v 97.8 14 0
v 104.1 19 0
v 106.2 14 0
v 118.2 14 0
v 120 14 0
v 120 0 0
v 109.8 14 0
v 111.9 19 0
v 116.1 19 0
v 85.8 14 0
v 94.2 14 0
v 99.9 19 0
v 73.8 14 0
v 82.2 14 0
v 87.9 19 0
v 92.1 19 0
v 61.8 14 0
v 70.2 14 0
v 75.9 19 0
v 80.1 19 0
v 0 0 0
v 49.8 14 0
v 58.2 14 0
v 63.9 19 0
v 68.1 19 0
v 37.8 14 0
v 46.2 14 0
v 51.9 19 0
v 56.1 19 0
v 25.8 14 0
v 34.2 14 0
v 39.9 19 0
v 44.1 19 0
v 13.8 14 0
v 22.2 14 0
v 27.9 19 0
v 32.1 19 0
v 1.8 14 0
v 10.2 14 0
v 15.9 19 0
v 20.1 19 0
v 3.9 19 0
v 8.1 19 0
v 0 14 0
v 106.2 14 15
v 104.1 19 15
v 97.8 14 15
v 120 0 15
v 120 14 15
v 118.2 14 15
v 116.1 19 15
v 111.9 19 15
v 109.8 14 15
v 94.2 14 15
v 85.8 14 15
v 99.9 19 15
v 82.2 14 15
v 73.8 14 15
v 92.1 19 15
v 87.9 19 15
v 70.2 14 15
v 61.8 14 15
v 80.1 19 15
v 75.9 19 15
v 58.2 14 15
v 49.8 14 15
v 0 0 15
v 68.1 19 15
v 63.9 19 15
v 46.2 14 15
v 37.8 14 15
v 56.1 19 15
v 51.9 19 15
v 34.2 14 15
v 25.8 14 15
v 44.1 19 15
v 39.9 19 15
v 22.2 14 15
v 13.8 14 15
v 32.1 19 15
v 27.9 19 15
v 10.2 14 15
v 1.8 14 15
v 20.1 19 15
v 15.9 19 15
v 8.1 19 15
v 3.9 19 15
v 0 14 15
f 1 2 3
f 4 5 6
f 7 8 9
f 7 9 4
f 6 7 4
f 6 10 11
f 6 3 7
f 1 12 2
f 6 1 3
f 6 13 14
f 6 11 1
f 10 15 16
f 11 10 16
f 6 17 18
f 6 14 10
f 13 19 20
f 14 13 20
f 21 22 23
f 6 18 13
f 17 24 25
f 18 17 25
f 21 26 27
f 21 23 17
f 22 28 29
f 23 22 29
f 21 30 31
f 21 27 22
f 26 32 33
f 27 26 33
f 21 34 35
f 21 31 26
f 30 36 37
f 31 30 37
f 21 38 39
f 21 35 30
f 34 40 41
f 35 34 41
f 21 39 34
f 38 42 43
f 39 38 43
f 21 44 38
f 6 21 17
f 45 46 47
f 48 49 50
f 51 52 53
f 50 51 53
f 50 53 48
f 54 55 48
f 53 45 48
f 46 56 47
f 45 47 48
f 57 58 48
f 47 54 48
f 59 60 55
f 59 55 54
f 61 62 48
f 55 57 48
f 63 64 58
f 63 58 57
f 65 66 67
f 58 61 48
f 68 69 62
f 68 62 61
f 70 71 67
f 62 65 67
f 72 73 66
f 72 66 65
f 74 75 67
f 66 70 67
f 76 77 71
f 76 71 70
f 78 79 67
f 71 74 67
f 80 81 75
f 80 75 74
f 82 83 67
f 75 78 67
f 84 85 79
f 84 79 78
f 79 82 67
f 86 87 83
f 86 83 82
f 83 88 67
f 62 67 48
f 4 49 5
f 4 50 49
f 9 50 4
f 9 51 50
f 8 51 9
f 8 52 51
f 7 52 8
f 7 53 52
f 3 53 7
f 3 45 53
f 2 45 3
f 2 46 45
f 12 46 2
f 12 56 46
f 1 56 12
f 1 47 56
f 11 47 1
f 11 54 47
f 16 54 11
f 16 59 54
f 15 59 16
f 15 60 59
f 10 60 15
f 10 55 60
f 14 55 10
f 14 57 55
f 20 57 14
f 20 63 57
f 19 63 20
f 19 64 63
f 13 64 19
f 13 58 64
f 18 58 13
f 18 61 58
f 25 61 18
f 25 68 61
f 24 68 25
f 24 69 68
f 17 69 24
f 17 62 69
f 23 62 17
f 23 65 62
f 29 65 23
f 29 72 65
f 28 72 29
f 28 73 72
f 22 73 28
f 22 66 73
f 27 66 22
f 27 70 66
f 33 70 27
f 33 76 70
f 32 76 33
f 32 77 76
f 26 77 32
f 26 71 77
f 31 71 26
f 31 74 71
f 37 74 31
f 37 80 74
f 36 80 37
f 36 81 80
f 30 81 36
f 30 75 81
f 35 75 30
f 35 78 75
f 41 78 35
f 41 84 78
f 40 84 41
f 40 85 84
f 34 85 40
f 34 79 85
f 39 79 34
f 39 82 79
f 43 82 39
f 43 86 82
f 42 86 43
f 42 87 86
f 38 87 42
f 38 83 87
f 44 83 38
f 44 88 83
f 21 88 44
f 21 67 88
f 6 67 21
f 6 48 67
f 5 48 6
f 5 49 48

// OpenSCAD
$fn = 32;

// ----------------------------------------------------------------------
// Gear rack: 10 teeth, pitch 12 mm
// ----------------------------------------------------------------------

// --- parameters (mm) ---
teeth = 10;               // number of teeth
pitch = 12;               // tooth pitch, X
root_w = 8.4;             // tooth width at the root
tip_w = 4.2;              // tooth width at the tip
base_h = 14;              // rack body height, Y
tooth_h = 5;              // tooth height above the body
plate_t = 15;             // rack width, Z (extrusion height)

rack_l = teeth * pitch;  // overall length
total_h = base_h + tooth_h;  // overall height

profile = [[0, 0], [120, 0], [120, 14], [118.2, 14], [116.1, 19], [111.9, 19], [109.8, 14], [106.2, 14], [104.1, 19], [99.9, 19], [97.8, 14], [94.2, 14], [92.1, 19], [87.9, 19], [85.8, 14], [82.2, 14], [80.1, 19], [75.9, 19], [73.8, 14], [70.2, 14], [68.1, 19], [63.9, 19], [61.8, 14], [58.2, 14], [56.1, 19], [51.9, 19], [49.8, 14], [46.2, 14], [44.1, 19], [39.9, 19], [37.8, 14], [34.2, 14], [32.1, 19], [27.9, 19], [25.8, 14], [22.2, 14], [20.1, 19], [15.9, 19], [13.8, 14], [10.2, 14], [8.1, 19], [3.9, 19], [1.8, 14], [0, 14]];  // primary outline, 44 points, counter clockwise

// --- the one profile operation ---
linear_extrude(height = plate_t) polygon(points = profile);
